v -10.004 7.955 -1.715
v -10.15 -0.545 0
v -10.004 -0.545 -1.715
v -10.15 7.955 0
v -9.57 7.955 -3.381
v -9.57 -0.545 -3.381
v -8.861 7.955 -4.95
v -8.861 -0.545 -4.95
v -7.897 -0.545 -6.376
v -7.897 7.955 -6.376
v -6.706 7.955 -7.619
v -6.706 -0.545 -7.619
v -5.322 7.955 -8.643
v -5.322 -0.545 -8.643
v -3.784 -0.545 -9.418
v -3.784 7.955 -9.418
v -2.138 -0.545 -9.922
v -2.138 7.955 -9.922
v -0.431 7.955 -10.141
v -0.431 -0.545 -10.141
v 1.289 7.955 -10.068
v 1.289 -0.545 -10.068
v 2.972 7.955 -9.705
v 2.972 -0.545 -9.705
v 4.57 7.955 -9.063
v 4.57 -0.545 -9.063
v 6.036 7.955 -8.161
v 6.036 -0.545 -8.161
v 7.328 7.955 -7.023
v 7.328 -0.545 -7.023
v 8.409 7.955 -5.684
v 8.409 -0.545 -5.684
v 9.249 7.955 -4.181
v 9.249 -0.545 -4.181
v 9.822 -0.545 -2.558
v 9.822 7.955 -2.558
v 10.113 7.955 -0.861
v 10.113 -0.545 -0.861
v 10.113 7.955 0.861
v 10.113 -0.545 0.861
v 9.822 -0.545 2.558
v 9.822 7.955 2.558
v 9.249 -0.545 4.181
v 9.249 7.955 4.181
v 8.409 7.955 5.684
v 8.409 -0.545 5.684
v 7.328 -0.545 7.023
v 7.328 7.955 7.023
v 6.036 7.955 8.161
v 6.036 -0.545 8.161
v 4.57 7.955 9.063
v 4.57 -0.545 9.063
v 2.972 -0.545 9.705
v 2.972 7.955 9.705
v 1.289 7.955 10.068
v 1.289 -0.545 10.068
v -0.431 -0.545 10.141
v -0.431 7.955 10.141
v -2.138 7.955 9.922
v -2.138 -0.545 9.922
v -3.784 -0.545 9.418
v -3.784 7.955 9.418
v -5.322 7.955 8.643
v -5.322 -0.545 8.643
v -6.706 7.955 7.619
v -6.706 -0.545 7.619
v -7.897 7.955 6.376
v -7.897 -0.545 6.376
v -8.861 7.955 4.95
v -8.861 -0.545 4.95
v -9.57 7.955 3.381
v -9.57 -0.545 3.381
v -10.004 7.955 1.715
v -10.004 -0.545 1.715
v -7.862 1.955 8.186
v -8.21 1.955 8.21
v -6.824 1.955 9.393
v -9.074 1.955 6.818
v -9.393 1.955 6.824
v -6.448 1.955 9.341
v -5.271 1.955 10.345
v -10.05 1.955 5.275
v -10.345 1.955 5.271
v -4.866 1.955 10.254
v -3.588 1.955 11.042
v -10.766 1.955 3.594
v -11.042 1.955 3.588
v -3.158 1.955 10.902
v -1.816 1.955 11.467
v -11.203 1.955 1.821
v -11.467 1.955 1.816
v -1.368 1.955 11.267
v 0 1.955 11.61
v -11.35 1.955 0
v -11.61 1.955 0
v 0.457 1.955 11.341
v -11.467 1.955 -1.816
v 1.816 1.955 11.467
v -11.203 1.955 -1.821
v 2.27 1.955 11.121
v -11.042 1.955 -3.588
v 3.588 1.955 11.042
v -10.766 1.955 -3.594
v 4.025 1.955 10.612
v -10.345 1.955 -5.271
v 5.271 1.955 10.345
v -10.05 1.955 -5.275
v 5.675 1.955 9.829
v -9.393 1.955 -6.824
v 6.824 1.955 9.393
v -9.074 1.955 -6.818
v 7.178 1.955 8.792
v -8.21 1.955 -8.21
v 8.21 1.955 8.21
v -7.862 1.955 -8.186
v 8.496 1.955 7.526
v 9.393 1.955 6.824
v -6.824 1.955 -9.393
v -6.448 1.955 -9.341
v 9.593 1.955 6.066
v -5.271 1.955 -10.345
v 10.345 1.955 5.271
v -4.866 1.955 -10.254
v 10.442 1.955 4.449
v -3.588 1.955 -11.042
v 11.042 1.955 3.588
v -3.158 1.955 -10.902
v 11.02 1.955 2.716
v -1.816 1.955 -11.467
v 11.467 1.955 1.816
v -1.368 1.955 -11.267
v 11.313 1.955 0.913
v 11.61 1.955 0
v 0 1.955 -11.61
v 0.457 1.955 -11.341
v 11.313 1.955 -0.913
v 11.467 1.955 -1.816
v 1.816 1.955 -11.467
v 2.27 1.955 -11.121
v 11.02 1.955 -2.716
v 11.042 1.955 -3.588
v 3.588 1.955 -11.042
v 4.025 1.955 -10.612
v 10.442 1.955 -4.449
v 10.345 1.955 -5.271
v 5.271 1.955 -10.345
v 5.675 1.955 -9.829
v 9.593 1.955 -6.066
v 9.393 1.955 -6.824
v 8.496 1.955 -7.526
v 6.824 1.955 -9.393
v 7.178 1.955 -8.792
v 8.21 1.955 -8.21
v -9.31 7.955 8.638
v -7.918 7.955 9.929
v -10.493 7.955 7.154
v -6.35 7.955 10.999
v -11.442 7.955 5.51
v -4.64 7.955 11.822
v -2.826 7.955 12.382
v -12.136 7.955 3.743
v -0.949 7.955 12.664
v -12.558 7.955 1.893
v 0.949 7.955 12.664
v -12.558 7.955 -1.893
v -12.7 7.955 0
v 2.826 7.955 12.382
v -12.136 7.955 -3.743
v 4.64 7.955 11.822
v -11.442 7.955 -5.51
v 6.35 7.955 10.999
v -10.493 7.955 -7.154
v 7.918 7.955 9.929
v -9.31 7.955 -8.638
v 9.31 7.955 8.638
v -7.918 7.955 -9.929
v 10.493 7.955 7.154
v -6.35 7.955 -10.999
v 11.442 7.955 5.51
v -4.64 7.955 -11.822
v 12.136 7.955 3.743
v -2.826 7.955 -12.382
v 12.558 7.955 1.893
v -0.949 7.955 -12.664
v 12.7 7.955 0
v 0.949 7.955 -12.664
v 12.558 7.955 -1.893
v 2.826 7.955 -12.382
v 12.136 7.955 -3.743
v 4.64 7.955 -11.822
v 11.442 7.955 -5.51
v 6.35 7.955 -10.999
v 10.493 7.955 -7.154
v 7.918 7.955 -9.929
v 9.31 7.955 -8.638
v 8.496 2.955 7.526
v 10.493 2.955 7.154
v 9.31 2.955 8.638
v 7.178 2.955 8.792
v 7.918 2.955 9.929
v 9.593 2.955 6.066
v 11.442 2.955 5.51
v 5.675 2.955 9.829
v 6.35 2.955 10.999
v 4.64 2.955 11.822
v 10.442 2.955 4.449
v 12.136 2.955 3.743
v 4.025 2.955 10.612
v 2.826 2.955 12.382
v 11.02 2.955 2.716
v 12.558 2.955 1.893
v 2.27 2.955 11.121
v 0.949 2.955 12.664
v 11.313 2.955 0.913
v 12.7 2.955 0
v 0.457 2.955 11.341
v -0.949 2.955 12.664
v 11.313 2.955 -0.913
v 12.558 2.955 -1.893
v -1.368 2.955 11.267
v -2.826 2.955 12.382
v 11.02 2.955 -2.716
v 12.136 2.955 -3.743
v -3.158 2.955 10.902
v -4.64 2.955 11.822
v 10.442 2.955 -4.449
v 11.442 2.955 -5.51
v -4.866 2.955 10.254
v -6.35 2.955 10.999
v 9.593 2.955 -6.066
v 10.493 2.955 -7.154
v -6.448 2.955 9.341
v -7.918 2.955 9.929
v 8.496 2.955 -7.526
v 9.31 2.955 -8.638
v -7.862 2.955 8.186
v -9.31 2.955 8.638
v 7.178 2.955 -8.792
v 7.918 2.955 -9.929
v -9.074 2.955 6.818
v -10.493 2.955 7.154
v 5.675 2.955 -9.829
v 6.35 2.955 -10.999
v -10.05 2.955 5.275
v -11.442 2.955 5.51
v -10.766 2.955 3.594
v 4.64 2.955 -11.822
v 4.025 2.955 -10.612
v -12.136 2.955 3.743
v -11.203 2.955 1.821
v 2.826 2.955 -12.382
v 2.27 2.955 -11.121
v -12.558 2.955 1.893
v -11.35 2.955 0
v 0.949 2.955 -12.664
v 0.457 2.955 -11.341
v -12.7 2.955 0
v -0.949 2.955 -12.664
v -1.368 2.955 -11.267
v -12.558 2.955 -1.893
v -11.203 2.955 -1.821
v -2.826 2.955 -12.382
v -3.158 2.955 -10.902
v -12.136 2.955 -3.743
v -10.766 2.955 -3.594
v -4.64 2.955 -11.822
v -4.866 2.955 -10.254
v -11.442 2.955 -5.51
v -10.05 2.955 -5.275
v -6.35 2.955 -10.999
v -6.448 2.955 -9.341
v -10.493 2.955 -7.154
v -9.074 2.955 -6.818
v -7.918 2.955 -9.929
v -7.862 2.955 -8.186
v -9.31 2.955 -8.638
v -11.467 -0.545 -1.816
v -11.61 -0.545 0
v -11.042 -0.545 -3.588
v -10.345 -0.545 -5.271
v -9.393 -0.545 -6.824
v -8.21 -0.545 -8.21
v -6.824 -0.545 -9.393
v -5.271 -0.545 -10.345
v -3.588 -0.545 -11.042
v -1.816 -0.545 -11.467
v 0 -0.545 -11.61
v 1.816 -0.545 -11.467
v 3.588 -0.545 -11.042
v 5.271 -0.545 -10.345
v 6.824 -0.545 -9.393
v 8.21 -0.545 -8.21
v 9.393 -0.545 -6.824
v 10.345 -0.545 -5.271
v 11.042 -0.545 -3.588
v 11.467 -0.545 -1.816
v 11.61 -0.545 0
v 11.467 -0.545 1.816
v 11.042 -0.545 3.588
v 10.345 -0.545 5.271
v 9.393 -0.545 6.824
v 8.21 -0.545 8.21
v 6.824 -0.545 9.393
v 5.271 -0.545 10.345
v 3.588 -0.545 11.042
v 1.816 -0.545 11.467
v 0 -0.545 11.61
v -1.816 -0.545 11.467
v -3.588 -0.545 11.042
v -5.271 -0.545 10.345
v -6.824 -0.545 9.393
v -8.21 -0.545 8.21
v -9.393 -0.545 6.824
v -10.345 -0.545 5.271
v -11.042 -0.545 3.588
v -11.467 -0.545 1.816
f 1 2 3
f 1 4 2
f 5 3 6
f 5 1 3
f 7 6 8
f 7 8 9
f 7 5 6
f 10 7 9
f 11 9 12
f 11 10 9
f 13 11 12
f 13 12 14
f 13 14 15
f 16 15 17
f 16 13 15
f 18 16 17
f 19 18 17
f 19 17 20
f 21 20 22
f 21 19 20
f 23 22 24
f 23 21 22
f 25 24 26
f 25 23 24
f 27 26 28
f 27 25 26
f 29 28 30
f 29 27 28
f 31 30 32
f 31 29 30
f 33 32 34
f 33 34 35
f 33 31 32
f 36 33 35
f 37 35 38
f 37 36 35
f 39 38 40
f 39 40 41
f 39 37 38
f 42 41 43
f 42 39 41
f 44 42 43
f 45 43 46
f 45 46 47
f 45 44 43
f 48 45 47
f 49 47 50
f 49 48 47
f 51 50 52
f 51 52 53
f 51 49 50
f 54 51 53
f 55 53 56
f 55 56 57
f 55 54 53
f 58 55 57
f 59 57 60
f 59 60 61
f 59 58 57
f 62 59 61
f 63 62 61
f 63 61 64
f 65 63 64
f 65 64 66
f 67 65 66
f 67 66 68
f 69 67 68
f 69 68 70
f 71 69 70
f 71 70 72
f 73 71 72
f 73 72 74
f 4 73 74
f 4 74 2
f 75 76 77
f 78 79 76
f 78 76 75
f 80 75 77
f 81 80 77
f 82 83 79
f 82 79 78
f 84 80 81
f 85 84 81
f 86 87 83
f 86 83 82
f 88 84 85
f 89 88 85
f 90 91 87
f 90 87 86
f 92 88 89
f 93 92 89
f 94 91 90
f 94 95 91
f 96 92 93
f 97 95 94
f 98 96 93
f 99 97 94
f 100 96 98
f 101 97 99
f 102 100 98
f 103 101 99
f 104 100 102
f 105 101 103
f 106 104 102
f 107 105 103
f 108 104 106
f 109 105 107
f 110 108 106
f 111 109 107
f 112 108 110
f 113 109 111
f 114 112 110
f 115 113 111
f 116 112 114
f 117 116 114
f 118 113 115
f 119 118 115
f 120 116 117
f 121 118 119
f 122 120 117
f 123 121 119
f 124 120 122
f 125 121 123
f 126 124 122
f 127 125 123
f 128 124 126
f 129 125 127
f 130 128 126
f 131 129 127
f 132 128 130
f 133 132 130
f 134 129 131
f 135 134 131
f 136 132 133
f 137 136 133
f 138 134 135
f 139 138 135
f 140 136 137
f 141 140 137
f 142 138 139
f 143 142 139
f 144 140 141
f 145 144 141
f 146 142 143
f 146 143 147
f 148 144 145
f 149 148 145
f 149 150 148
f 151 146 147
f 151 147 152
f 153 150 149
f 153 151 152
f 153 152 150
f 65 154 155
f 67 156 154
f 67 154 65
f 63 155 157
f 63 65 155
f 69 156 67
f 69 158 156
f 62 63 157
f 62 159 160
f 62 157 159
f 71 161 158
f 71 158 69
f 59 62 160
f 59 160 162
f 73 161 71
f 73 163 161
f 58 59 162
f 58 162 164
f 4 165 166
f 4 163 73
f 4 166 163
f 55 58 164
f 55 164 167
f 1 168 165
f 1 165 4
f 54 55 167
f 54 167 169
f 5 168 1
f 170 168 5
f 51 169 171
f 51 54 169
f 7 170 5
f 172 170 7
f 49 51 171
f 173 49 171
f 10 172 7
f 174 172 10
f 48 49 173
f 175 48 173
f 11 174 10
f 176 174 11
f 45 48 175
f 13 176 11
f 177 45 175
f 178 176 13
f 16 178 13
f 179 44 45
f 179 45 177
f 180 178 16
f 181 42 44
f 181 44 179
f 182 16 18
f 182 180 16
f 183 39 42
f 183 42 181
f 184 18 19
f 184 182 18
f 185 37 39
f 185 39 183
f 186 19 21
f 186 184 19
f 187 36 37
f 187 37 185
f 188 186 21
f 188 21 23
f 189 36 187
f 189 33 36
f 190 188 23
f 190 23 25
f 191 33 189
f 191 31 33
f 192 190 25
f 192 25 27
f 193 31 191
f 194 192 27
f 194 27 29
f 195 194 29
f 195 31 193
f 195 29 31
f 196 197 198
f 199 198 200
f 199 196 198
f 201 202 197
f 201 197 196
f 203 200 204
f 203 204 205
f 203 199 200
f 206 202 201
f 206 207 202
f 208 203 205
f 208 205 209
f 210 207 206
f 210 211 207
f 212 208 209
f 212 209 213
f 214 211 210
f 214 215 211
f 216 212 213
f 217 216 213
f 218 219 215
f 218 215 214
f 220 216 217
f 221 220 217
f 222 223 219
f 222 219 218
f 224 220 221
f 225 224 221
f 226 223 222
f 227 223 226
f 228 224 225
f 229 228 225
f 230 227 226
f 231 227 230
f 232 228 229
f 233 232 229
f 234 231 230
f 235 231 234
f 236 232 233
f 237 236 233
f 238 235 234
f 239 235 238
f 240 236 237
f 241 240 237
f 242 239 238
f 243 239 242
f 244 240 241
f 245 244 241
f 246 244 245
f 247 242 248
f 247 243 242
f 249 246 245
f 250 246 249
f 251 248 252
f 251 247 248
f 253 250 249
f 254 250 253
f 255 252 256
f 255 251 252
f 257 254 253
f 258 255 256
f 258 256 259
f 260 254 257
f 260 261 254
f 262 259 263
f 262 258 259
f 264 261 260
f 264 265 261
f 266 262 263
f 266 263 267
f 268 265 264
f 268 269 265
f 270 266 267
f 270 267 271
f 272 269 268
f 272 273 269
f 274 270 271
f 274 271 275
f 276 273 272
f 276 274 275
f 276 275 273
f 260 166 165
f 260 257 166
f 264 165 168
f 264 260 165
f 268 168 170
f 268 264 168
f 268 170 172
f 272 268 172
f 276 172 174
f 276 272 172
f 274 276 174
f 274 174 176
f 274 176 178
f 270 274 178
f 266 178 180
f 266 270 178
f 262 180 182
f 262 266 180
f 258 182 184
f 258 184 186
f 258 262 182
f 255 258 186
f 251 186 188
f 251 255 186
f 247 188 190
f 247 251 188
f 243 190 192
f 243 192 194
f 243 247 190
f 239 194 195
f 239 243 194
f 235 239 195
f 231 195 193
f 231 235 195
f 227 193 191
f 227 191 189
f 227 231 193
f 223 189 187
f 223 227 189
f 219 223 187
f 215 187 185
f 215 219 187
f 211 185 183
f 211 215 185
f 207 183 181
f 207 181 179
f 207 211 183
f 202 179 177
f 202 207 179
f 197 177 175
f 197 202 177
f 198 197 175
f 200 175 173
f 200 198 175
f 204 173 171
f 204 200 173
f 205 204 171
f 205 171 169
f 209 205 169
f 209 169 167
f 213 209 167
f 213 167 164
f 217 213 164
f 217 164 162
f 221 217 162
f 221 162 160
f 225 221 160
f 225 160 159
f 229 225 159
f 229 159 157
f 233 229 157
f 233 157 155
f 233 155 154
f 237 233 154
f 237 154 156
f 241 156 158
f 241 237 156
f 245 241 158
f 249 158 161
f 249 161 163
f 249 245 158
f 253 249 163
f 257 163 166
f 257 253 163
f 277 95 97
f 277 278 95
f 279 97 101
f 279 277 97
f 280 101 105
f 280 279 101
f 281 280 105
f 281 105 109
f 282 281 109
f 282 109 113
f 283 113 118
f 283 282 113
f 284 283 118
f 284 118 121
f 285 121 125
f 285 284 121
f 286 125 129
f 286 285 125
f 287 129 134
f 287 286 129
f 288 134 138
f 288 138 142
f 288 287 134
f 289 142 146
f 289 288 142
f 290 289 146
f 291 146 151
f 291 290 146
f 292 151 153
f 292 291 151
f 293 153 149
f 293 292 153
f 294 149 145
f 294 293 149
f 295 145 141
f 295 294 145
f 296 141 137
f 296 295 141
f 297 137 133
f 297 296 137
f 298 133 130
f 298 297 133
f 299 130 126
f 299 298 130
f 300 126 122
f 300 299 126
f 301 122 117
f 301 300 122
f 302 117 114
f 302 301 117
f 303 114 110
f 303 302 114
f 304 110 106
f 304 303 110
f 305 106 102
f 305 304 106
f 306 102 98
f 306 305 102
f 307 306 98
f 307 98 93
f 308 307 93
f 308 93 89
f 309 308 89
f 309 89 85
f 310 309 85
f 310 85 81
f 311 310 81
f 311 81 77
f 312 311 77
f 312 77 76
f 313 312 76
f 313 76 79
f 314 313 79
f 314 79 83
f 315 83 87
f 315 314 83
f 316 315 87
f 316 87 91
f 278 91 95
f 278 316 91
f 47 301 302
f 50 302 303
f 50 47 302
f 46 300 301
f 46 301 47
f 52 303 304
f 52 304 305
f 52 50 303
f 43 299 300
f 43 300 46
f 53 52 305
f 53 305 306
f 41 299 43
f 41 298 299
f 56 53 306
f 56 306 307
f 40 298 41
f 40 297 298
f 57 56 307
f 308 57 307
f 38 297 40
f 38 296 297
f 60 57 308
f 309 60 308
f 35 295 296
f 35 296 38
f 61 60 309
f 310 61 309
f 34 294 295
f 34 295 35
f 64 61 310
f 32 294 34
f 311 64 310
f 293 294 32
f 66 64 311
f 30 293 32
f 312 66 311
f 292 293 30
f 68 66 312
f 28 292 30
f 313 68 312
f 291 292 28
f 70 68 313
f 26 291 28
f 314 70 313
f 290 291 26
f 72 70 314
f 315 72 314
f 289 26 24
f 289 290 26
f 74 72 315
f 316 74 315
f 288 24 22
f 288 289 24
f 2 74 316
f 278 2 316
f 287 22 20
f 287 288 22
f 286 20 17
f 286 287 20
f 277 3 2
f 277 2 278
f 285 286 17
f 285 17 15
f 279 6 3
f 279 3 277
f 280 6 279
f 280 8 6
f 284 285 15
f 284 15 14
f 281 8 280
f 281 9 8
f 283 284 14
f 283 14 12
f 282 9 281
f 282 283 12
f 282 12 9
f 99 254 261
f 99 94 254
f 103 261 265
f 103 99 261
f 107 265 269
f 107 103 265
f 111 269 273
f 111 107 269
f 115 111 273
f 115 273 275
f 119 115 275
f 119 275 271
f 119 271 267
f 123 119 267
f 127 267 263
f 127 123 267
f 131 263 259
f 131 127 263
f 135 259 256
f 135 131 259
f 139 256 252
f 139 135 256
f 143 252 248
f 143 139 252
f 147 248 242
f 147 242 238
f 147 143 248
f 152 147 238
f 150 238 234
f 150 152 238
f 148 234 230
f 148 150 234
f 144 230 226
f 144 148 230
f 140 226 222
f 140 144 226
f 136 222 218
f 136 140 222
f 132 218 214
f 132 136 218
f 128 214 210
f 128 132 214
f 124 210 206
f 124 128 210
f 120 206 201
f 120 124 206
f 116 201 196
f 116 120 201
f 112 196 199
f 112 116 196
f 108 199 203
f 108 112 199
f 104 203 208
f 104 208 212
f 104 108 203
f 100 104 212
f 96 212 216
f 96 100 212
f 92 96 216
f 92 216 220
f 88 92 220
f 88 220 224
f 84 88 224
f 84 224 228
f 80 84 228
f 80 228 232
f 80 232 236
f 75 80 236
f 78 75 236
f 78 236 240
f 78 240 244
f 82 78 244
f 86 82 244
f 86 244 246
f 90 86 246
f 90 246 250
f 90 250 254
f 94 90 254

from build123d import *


with BuildPart() as part:
    # 草图1 → 旋转1 (revolve)
    with BuildSketch(Plane.XY, mode=Mode.PRIVATE) as revolve_1_sk:
        Polygon((10.15, -0.545464411), (10.15, 7.954535589), (12.7, 7.954535589), (12.7, 2.954535589), (11.35, 2.954535589), (11.35, 1.954535589), (11.61, 1.954535589), (11.61, -0.545464411), align=None)
    revolve(revolve_1_sk.sketch.rotate(Axis((0, 16.886018237, 0), (0, -1, 0)), 180), axis=Axis((0, 16.886018237, 0), (0, -1, 0)))  # turned: the seam where the file's is


solid = part.part
